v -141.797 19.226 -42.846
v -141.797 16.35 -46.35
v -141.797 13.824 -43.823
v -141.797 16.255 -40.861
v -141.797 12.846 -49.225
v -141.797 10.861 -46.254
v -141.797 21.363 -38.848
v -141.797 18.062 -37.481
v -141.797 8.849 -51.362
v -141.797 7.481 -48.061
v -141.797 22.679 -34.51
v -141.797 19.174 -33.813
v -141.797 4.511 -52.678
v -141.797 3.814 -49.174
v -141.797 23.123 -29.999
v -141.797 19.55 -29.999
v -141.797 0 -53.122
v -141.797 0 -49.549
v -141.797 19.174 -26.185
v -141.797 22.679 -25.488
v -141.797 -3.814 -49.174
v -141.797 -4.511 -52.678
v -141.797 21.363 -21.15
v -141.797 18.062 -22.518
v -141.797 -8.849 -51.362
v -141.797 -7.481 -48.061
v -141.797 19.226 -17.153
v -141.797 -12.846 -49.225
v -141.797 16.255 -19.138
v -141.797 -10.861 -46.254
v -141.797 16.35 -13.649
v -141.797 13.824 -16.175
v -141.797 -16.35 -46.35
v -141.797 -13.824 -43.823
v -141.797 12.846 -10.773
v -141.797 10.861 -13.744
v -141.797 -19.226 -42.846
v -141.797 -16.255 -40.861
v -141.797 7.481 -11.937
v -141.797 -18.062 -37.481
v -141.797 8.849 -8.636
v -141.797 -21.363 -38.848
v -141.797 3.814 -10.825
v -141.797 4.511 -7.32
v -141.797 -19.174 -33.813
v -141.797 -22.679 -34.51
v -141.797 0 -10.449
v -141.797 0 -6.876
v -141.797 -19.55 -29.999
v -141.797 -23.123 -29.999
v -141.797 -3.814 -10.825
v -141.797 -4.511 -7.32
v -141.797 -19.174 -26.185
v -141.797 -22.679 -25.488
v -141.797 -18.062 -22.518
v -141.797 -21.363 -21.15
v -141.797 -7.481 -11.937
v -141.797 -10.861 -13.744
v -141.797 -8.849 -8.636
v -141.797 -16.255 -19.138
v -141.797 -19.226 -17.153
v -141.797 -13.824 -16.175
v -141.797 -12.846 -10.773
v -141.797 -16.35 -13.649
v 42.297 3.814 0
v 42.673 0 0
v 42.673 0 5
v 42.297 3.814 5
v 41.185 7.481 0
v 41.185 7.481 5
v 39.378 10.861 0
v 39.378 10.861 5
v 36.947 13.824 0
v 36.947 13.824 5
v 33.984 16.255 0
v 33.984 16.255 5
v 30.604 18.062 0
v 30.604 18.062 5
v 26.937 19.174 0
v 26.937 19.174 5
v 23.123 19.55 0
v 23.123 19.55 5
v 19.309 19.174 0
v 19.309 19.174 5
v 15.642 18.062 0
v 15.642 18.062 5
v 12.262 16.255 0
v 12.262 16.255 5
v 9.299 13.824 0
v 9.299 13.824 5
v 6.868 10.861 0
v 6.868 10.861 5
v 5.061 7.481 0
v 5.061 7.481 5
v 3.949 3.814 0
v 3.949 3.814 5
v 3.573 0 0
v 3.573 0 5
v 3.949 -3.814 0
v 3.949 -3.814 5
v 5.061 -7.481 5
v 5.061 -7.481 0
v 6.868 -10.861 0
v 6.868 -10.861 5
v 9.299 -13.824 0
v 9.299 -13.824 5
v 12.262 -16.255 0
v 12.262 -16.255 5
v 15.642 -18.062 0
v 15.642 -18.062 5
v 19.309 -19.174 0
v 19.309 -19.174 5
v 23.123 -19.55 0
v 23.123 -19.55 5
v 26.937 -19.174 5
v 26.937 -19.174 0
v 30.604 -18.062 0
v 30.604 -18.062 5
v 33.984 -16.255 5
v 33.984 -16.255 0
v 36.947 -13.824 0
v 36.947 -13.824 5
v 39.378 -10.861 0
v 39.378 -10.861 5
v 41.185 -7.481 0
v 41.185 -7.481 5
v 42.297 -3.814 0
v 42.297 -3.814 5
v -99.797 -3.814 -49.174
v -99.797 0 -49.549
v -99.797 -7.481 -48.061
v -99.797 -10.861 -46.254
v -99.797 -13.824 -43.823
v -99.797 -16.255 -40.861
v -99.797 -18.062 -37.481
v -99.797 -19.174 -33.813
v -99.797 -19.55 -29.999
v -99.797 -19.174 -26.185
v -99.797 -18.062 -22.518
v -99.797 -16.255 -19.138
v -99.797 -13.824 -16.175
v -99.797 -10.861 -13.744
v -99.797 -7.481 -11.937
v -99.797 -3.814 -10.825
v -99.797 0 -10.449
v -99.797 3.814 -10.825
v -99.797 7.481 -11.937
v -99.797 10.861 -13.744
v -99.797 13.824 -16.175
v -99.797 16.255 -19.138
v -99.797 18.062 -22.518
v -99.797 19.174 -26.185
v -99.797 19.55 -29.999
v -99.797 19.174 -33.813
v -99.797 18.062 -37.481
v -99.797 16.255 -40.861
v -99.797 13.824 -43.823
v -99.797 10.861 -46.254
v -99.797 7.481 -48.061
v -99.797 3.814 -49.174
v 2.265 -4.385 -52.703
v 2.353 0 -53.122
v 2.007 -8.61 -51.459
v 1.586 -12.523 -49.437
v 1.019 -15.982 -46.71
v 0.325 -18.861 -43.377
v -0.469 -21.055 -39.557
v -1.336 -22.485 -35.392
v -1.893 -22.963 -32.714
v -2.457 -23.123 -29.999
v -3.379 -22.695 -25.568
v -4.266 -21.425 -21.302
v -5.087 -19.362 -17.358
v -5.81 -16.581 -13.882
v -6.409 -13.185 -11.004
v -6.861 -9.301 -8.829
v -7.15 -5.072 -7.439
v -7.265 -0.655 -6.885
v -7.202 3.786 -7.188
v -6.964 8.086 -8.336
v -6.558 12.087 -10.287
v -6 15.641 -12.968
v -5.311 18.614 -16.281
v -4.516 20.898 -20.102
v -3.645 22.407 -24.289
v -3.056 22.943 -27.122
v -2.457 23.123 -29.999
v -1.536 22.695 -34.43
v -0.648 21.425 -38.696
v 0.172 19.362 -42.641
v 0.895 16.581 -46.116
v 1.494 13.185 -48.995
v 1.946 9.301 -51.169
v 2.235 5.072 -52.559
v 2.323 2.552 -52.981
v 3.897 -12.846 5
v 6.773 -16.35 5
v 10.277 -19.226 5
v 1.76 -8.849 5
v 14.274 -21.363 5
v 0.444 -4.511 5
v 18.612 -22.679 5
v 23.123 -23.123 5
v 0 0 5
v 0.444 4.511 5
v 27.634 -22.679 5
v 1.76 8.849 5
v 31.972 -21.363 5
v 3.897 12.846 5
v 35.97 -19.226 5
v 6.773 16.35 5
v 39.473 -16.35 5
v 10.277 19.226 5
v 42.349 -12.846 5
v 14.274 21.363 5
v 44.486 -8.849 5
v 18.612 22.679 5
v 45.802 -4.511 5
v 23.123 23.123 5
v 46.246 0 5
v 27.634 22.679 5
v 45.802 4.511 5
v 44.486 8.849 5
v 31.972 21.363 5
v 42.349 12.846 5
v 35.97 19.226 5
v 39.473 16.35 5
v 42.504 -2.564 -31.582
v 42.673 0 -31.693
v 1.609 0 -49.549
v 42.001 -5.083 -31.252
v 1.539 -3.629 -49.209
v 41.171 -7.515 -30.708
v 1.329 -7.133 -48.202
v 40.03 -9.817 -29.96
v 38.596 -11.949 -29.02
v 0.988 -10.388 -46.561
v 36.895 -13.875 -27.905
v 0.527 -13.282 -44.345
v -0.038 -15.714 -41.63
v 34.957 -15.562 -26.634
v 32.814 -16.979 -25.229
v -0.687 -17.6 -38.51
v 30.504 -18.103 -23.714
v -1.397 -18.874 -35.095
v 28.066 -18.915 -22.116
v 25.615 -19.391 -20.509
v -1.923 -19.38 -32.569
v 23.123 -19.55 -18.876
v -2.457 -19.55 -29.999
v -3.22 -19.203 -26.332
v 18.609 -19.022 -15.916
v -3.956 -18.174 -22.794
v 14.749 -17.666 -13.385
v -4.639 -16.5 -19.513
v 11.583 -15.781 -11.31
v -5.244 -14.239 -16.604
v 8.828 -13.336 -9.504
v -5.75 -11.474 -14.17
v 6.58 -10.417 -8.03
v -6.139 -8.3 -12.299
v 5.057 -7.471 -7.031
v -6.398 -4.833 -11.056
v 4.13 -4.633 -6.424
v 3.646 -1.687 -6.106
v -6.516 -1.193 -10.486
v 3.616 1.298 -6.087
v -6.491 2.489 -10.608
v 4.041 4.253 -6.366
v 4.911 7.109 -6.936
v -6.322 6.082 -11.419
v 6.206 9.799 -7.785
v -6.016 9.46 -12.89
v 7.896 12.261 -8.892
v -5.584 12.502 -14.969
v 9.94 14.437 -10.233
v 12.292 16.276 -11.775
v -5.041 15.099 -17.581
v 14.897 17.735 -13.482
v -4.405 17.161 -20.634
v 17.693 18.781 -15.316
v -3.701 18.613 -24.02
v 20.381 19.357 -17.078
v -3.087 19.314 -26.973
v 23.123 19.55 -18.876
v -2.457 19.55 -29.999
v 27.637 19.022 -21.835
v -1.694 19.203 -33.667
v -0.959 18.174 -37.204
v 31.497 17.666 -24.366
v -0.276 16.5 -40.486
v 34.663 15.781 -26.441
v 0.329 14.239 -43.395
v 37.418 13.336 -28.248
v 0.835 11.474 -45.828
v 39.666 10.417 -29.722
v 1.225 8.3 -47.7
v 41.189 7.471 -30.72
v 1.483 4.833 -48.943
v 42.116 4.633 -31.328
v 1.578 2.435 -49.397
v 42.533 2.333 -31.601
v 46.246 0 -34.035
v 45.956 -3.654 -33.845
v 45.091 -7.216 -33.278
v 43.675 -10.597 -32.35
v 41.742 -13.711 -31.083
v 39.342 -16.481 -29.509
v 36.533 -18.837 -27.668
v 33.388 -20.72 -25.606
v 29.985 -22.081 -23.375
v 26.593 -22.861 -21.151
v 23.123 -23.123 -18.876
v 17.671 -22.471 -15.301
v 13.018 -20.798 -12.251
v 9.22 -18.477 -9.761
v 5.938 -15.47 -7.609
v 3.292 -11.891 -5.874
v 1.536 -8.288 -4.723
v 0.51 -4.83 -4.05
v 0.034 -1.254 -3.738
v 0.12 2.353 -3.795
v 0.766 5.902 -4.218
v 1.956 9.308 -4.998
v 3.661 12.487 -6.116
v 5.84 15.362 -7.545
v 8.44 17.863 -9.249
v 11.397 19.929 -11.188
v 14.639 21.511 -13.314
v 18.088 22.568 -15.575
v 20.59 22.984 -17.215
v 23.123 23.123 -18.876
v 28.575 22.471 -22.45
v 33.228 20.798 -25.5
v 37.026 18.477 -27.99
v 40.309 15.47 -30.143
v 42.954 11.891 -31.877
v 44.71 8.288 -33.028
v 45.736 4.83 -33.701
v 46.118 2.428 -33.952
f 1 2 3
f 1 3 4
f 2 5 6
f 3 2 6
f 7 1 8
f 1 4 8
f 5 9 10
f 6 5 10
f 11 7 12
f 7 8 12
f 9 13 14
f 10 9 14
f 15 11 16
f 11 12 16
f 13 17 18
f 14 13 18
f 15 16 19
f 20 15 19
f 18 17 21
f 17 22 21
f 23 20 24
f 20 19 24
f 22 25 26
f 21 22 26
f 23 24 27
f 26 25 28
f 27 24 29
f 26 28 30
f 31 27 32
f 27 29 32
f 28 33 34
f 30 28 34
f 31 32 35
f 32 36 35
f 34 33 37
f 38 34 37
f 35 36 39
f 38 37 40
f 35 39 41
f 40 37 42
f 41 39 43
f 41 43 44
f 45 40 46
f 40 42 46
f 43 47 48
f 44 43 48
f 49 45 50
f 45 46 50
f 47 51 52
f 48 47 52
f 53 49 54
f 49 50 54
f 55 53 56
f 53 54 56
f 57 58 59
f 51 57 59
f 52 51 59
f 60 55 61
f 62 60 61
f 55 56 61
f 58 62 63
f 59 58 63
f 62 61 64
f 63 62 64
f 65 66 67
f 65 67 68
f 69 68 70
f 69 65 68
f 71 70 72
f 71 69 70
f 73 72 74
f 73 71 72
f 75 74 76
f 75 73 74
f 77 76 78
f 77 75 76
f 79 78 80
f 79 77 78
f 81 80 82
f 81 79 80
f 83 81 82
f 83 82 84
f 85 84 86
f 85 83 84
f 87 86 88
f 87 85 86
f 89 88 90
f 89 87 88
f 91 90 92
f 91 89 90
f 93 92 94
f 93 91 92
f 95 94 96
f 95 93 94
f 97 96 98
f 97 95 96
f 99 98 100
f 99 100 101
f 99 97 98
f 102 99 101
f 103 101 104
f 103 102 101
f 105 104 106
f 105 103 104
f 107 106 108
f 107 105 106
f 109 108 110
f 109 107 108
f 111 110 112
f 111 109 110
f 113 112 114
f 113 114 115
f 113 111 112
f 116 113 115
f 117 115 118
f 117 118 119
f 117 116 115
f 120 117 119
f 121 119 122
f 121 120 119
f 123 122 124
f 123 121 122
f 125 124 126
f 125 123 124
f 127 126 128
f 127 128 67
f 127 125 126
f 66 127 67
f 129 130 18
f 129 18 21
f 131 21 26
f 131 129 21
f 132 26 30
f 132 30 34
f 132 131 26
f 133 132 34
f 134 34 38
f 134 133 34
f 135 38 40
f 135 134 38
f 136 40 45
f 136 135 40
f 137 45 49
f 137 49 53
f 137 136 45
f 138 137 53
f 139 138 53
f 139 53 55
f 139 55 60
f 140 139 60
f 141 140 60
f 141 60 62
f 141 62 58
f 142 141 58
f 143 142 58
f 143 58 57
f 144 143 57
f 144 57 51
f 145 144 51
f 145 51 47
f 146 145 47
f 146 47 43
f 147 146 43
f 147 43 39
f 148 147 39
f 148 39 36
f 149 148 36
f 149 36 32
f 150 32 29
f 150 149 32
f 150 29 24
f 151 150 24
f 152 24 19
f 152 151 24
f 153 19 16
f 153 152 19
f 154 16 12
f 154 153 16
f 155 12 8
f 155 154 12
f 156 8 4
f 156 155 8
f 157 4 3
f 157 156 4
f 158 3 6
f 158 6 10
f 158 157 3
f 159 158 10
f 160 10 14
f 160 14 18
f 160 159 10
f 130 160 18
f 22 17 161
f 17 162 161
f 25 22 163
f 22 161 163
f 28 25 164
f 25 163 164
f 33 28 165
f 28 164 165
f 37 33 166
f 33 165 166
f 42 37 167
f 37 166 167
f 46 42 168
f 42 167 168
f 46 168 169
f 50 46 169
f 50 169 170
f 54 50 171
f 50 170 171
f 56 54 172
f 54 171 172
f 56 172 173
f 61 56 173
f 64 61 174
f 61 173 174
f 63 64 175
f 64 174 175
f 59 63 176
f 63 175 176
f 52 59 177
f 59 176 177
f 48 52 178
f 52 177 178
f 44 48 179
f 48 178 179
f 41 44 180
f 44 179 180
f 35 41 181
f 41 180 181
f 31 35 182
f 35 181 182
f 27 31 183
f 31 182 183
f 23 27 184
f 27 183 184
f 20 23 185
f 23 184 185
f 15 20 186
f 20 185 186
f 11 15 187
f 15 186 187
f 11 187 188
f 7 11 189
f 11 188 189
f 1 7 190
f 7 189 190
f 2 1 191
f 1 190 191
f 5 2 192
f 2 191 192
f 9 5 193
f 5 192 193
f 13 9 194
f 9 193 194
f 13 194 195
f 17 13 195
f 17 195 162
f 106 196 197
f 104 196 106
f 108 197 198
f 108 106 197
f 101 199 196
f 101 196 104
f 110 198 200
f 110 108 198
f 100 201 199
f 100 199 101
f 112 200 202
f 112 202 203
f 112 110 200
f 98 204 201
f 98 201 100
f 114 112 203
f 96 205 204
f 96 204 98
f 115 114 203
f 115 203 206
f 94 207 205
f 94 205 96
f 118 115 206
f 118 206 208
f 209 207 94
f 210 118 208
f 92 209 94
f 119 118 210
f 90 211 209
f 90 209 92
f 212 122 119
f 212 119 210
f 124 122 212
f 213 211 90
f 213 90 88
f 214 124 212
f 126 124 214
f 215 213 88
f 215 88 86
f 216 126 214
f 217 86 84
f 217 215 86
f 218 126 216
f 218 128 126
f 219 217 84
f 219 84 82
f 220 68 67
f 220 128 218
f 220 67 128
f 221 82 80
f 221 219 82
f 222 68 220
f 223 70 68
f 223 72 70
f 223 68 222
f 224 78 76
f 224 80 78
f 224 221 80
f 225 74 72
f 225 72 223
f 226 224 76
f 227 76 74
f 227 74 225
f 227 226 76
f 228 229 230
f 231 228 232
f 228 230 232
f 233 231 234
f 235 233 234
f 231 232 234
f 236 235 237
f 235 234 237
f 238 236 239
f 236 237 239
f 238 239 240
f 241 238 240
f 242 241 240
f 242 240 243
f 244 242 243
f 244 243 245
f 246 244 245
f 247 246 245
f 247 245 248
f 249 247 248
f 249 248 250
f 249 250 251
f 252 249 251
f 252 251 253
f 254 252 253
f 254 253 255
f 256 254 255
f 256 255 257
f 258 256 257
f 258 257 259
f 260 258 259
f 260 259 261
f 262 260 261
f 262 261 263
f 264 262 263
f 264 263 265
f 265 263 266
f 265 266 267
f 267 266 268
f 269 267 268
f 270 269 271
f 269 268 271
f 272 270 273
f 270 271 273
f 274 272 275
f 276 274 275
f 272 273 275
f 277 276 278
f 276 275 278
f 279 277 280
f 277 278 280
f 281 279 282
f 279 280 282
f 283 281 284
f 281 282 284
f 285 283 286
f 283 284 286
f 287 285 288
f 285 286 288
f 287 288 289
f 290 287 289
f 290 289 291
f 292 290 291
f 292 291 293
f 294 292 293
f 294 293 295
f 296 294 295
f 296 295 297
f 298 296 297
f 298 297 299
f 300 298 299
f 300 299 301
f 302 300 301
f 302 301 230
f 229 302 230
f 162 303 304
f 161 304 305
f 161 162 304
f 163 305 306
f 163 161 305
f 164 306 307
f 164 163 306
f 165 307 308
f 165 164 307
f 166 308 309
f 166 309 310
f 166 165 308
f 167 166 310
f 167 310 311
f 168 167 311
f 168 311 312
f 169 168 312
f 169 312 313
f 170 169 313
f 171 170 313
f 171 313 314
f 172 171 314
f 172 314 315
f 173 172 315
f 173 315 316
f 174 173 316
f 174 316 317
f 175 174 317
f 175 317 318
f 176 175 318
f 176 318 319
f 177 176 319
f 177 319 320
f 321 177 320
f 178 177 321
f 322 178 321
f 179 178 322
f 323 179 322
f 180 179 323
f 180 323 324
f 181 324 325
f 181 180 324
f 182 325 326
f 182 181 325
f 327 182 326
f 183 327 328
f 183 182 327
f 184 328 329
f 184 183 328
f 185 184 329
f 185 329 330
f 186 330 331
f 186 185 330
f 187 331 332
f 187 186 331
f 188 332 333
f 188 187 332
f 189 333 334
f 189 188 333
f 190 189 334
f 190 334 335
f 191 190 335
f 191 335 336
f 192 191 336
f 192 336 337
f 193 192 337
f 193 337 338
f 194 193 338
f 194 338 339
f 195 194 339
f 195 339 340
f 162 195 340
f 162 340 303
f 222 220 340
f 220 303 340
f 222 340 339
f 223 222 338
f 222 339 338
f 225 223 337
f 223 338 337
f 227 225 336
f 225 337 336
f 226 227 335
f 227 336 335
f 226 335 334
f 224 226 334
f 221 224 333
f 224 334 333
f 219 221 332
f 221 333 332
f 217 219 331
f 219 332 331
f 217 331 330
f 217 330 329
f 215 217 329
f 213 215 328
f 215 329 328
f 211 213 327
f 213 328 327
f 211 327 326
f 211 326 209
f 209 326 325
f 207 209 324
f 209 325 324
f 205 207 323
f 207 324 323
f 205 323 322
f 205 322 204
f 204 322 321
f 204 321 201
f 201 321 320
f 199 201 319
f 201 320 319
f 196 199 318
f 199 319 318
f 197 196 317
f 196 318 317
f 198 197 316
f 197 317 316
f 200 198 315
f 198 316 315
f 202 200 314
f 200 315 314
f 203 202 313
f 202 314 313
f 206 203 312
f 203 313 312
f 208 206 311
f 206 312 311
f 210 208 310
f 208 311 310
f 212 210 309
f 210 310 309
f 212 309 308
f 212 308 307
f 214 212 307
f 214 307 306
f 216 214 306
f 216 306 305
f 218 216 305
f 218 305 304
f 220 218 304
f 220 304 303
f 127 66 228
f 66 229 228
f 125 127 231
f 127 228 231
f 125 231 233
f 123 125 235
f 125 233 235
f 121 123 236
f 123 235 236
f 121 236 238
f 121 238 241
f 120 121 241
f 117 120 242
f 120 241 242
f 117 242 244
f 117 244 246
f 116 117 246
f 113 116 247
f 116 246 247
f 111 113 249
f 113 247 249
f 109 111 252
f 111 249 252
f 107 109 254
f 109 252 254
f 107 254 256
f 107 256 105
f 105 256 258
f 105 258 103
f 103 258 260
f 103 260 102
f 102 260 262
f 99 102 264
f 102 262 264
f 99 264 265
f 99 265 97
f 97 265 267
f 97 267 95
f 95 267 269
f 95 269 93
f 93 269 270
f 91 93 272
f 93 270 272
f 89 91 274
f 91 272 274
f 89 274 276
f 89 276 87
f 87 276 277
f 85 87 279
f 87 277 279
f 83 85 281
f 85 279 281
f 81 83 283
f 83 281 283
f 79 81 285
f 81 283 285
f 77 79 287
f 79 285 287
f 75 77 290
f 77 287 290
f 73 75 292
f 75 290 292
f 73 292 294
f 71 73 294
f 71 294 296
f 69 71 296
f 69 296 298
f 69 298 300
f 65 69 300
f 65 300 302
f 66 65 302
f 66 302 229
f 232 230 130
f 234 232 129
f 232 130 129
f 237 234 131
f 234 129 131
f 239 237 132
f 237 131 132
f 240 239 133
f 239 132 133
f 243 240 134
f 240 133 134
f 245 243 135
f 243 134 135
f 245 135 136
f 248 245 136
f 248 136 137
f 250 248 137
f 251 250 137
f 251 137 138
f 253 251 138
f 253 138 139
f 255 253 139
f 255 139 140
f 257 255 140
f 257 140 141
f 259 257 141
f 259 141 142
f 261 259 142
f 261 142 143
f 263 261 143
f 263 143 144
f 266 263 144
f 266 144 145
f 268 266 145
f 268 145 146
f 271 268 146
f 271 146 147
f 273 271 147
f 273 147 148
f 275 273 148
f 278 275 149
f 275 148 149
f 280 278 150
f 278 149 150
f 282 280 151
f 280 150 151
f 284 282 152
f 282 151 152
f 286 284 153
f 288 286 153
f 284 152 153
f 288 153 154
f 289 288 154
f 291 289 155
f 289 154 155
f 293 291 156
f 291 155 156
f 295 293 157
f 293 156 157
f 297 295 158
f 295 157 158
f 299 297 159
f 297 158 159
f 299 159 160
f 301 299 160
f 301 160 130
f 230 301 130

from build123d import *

# Parameters (mm, degrees)
F1_R     = 23.1230345184
F1_R_2   = 19.55
F3_DEPTH = 5
F4_DEPTH = 42


with BuildPart() as f2:
    # F2: sweep along a path in F0
    with BuildLine(Plane.XZ) as f2_path:
        Line((23.1230345184, 0), (23.1230345184, -18.8757088035))
        Line((23.1230345184, -18.8757088035), (-2.4573525631, -29.9991816282))
        Line((-2.4573525631, -29.9991816282), (-99.7967123985, -29.9991816282))
    # F1 (on Top) → F2 (sweep)
    with BuildSketch(Plane.XY):
        with Locations((23.1230345184, 0)):
            Circle(F1_R)
        with Locations((23.1230345184, 0)):
            Circle(F1_R_2, mode=Mode.SUBTRACT)
    sweep(path=f2_path.line, transition=Transition.RIGHT)

    # F1 (on Top) → F3 (join)
    with BuildSketch(Plane.XY):
        with Locations((23.1230345184, 0)):
            Circle(F1_R)
        with Locations((23.1230345184, 0)):
            Circle(F1_R_2, mode=Mode.SUBTRACT)
    extrude(amount=F3_DEPTH)

    # F4 (add): a face of the model
    f4_faces = [f2.faces().sort_by_distance(p)[0] for p in [
        (-99.7967123985, 0, -7.5301652902),
    ]]
    extrude(f4_faces, amount=F4_DEPTH)


solid = f2.part
